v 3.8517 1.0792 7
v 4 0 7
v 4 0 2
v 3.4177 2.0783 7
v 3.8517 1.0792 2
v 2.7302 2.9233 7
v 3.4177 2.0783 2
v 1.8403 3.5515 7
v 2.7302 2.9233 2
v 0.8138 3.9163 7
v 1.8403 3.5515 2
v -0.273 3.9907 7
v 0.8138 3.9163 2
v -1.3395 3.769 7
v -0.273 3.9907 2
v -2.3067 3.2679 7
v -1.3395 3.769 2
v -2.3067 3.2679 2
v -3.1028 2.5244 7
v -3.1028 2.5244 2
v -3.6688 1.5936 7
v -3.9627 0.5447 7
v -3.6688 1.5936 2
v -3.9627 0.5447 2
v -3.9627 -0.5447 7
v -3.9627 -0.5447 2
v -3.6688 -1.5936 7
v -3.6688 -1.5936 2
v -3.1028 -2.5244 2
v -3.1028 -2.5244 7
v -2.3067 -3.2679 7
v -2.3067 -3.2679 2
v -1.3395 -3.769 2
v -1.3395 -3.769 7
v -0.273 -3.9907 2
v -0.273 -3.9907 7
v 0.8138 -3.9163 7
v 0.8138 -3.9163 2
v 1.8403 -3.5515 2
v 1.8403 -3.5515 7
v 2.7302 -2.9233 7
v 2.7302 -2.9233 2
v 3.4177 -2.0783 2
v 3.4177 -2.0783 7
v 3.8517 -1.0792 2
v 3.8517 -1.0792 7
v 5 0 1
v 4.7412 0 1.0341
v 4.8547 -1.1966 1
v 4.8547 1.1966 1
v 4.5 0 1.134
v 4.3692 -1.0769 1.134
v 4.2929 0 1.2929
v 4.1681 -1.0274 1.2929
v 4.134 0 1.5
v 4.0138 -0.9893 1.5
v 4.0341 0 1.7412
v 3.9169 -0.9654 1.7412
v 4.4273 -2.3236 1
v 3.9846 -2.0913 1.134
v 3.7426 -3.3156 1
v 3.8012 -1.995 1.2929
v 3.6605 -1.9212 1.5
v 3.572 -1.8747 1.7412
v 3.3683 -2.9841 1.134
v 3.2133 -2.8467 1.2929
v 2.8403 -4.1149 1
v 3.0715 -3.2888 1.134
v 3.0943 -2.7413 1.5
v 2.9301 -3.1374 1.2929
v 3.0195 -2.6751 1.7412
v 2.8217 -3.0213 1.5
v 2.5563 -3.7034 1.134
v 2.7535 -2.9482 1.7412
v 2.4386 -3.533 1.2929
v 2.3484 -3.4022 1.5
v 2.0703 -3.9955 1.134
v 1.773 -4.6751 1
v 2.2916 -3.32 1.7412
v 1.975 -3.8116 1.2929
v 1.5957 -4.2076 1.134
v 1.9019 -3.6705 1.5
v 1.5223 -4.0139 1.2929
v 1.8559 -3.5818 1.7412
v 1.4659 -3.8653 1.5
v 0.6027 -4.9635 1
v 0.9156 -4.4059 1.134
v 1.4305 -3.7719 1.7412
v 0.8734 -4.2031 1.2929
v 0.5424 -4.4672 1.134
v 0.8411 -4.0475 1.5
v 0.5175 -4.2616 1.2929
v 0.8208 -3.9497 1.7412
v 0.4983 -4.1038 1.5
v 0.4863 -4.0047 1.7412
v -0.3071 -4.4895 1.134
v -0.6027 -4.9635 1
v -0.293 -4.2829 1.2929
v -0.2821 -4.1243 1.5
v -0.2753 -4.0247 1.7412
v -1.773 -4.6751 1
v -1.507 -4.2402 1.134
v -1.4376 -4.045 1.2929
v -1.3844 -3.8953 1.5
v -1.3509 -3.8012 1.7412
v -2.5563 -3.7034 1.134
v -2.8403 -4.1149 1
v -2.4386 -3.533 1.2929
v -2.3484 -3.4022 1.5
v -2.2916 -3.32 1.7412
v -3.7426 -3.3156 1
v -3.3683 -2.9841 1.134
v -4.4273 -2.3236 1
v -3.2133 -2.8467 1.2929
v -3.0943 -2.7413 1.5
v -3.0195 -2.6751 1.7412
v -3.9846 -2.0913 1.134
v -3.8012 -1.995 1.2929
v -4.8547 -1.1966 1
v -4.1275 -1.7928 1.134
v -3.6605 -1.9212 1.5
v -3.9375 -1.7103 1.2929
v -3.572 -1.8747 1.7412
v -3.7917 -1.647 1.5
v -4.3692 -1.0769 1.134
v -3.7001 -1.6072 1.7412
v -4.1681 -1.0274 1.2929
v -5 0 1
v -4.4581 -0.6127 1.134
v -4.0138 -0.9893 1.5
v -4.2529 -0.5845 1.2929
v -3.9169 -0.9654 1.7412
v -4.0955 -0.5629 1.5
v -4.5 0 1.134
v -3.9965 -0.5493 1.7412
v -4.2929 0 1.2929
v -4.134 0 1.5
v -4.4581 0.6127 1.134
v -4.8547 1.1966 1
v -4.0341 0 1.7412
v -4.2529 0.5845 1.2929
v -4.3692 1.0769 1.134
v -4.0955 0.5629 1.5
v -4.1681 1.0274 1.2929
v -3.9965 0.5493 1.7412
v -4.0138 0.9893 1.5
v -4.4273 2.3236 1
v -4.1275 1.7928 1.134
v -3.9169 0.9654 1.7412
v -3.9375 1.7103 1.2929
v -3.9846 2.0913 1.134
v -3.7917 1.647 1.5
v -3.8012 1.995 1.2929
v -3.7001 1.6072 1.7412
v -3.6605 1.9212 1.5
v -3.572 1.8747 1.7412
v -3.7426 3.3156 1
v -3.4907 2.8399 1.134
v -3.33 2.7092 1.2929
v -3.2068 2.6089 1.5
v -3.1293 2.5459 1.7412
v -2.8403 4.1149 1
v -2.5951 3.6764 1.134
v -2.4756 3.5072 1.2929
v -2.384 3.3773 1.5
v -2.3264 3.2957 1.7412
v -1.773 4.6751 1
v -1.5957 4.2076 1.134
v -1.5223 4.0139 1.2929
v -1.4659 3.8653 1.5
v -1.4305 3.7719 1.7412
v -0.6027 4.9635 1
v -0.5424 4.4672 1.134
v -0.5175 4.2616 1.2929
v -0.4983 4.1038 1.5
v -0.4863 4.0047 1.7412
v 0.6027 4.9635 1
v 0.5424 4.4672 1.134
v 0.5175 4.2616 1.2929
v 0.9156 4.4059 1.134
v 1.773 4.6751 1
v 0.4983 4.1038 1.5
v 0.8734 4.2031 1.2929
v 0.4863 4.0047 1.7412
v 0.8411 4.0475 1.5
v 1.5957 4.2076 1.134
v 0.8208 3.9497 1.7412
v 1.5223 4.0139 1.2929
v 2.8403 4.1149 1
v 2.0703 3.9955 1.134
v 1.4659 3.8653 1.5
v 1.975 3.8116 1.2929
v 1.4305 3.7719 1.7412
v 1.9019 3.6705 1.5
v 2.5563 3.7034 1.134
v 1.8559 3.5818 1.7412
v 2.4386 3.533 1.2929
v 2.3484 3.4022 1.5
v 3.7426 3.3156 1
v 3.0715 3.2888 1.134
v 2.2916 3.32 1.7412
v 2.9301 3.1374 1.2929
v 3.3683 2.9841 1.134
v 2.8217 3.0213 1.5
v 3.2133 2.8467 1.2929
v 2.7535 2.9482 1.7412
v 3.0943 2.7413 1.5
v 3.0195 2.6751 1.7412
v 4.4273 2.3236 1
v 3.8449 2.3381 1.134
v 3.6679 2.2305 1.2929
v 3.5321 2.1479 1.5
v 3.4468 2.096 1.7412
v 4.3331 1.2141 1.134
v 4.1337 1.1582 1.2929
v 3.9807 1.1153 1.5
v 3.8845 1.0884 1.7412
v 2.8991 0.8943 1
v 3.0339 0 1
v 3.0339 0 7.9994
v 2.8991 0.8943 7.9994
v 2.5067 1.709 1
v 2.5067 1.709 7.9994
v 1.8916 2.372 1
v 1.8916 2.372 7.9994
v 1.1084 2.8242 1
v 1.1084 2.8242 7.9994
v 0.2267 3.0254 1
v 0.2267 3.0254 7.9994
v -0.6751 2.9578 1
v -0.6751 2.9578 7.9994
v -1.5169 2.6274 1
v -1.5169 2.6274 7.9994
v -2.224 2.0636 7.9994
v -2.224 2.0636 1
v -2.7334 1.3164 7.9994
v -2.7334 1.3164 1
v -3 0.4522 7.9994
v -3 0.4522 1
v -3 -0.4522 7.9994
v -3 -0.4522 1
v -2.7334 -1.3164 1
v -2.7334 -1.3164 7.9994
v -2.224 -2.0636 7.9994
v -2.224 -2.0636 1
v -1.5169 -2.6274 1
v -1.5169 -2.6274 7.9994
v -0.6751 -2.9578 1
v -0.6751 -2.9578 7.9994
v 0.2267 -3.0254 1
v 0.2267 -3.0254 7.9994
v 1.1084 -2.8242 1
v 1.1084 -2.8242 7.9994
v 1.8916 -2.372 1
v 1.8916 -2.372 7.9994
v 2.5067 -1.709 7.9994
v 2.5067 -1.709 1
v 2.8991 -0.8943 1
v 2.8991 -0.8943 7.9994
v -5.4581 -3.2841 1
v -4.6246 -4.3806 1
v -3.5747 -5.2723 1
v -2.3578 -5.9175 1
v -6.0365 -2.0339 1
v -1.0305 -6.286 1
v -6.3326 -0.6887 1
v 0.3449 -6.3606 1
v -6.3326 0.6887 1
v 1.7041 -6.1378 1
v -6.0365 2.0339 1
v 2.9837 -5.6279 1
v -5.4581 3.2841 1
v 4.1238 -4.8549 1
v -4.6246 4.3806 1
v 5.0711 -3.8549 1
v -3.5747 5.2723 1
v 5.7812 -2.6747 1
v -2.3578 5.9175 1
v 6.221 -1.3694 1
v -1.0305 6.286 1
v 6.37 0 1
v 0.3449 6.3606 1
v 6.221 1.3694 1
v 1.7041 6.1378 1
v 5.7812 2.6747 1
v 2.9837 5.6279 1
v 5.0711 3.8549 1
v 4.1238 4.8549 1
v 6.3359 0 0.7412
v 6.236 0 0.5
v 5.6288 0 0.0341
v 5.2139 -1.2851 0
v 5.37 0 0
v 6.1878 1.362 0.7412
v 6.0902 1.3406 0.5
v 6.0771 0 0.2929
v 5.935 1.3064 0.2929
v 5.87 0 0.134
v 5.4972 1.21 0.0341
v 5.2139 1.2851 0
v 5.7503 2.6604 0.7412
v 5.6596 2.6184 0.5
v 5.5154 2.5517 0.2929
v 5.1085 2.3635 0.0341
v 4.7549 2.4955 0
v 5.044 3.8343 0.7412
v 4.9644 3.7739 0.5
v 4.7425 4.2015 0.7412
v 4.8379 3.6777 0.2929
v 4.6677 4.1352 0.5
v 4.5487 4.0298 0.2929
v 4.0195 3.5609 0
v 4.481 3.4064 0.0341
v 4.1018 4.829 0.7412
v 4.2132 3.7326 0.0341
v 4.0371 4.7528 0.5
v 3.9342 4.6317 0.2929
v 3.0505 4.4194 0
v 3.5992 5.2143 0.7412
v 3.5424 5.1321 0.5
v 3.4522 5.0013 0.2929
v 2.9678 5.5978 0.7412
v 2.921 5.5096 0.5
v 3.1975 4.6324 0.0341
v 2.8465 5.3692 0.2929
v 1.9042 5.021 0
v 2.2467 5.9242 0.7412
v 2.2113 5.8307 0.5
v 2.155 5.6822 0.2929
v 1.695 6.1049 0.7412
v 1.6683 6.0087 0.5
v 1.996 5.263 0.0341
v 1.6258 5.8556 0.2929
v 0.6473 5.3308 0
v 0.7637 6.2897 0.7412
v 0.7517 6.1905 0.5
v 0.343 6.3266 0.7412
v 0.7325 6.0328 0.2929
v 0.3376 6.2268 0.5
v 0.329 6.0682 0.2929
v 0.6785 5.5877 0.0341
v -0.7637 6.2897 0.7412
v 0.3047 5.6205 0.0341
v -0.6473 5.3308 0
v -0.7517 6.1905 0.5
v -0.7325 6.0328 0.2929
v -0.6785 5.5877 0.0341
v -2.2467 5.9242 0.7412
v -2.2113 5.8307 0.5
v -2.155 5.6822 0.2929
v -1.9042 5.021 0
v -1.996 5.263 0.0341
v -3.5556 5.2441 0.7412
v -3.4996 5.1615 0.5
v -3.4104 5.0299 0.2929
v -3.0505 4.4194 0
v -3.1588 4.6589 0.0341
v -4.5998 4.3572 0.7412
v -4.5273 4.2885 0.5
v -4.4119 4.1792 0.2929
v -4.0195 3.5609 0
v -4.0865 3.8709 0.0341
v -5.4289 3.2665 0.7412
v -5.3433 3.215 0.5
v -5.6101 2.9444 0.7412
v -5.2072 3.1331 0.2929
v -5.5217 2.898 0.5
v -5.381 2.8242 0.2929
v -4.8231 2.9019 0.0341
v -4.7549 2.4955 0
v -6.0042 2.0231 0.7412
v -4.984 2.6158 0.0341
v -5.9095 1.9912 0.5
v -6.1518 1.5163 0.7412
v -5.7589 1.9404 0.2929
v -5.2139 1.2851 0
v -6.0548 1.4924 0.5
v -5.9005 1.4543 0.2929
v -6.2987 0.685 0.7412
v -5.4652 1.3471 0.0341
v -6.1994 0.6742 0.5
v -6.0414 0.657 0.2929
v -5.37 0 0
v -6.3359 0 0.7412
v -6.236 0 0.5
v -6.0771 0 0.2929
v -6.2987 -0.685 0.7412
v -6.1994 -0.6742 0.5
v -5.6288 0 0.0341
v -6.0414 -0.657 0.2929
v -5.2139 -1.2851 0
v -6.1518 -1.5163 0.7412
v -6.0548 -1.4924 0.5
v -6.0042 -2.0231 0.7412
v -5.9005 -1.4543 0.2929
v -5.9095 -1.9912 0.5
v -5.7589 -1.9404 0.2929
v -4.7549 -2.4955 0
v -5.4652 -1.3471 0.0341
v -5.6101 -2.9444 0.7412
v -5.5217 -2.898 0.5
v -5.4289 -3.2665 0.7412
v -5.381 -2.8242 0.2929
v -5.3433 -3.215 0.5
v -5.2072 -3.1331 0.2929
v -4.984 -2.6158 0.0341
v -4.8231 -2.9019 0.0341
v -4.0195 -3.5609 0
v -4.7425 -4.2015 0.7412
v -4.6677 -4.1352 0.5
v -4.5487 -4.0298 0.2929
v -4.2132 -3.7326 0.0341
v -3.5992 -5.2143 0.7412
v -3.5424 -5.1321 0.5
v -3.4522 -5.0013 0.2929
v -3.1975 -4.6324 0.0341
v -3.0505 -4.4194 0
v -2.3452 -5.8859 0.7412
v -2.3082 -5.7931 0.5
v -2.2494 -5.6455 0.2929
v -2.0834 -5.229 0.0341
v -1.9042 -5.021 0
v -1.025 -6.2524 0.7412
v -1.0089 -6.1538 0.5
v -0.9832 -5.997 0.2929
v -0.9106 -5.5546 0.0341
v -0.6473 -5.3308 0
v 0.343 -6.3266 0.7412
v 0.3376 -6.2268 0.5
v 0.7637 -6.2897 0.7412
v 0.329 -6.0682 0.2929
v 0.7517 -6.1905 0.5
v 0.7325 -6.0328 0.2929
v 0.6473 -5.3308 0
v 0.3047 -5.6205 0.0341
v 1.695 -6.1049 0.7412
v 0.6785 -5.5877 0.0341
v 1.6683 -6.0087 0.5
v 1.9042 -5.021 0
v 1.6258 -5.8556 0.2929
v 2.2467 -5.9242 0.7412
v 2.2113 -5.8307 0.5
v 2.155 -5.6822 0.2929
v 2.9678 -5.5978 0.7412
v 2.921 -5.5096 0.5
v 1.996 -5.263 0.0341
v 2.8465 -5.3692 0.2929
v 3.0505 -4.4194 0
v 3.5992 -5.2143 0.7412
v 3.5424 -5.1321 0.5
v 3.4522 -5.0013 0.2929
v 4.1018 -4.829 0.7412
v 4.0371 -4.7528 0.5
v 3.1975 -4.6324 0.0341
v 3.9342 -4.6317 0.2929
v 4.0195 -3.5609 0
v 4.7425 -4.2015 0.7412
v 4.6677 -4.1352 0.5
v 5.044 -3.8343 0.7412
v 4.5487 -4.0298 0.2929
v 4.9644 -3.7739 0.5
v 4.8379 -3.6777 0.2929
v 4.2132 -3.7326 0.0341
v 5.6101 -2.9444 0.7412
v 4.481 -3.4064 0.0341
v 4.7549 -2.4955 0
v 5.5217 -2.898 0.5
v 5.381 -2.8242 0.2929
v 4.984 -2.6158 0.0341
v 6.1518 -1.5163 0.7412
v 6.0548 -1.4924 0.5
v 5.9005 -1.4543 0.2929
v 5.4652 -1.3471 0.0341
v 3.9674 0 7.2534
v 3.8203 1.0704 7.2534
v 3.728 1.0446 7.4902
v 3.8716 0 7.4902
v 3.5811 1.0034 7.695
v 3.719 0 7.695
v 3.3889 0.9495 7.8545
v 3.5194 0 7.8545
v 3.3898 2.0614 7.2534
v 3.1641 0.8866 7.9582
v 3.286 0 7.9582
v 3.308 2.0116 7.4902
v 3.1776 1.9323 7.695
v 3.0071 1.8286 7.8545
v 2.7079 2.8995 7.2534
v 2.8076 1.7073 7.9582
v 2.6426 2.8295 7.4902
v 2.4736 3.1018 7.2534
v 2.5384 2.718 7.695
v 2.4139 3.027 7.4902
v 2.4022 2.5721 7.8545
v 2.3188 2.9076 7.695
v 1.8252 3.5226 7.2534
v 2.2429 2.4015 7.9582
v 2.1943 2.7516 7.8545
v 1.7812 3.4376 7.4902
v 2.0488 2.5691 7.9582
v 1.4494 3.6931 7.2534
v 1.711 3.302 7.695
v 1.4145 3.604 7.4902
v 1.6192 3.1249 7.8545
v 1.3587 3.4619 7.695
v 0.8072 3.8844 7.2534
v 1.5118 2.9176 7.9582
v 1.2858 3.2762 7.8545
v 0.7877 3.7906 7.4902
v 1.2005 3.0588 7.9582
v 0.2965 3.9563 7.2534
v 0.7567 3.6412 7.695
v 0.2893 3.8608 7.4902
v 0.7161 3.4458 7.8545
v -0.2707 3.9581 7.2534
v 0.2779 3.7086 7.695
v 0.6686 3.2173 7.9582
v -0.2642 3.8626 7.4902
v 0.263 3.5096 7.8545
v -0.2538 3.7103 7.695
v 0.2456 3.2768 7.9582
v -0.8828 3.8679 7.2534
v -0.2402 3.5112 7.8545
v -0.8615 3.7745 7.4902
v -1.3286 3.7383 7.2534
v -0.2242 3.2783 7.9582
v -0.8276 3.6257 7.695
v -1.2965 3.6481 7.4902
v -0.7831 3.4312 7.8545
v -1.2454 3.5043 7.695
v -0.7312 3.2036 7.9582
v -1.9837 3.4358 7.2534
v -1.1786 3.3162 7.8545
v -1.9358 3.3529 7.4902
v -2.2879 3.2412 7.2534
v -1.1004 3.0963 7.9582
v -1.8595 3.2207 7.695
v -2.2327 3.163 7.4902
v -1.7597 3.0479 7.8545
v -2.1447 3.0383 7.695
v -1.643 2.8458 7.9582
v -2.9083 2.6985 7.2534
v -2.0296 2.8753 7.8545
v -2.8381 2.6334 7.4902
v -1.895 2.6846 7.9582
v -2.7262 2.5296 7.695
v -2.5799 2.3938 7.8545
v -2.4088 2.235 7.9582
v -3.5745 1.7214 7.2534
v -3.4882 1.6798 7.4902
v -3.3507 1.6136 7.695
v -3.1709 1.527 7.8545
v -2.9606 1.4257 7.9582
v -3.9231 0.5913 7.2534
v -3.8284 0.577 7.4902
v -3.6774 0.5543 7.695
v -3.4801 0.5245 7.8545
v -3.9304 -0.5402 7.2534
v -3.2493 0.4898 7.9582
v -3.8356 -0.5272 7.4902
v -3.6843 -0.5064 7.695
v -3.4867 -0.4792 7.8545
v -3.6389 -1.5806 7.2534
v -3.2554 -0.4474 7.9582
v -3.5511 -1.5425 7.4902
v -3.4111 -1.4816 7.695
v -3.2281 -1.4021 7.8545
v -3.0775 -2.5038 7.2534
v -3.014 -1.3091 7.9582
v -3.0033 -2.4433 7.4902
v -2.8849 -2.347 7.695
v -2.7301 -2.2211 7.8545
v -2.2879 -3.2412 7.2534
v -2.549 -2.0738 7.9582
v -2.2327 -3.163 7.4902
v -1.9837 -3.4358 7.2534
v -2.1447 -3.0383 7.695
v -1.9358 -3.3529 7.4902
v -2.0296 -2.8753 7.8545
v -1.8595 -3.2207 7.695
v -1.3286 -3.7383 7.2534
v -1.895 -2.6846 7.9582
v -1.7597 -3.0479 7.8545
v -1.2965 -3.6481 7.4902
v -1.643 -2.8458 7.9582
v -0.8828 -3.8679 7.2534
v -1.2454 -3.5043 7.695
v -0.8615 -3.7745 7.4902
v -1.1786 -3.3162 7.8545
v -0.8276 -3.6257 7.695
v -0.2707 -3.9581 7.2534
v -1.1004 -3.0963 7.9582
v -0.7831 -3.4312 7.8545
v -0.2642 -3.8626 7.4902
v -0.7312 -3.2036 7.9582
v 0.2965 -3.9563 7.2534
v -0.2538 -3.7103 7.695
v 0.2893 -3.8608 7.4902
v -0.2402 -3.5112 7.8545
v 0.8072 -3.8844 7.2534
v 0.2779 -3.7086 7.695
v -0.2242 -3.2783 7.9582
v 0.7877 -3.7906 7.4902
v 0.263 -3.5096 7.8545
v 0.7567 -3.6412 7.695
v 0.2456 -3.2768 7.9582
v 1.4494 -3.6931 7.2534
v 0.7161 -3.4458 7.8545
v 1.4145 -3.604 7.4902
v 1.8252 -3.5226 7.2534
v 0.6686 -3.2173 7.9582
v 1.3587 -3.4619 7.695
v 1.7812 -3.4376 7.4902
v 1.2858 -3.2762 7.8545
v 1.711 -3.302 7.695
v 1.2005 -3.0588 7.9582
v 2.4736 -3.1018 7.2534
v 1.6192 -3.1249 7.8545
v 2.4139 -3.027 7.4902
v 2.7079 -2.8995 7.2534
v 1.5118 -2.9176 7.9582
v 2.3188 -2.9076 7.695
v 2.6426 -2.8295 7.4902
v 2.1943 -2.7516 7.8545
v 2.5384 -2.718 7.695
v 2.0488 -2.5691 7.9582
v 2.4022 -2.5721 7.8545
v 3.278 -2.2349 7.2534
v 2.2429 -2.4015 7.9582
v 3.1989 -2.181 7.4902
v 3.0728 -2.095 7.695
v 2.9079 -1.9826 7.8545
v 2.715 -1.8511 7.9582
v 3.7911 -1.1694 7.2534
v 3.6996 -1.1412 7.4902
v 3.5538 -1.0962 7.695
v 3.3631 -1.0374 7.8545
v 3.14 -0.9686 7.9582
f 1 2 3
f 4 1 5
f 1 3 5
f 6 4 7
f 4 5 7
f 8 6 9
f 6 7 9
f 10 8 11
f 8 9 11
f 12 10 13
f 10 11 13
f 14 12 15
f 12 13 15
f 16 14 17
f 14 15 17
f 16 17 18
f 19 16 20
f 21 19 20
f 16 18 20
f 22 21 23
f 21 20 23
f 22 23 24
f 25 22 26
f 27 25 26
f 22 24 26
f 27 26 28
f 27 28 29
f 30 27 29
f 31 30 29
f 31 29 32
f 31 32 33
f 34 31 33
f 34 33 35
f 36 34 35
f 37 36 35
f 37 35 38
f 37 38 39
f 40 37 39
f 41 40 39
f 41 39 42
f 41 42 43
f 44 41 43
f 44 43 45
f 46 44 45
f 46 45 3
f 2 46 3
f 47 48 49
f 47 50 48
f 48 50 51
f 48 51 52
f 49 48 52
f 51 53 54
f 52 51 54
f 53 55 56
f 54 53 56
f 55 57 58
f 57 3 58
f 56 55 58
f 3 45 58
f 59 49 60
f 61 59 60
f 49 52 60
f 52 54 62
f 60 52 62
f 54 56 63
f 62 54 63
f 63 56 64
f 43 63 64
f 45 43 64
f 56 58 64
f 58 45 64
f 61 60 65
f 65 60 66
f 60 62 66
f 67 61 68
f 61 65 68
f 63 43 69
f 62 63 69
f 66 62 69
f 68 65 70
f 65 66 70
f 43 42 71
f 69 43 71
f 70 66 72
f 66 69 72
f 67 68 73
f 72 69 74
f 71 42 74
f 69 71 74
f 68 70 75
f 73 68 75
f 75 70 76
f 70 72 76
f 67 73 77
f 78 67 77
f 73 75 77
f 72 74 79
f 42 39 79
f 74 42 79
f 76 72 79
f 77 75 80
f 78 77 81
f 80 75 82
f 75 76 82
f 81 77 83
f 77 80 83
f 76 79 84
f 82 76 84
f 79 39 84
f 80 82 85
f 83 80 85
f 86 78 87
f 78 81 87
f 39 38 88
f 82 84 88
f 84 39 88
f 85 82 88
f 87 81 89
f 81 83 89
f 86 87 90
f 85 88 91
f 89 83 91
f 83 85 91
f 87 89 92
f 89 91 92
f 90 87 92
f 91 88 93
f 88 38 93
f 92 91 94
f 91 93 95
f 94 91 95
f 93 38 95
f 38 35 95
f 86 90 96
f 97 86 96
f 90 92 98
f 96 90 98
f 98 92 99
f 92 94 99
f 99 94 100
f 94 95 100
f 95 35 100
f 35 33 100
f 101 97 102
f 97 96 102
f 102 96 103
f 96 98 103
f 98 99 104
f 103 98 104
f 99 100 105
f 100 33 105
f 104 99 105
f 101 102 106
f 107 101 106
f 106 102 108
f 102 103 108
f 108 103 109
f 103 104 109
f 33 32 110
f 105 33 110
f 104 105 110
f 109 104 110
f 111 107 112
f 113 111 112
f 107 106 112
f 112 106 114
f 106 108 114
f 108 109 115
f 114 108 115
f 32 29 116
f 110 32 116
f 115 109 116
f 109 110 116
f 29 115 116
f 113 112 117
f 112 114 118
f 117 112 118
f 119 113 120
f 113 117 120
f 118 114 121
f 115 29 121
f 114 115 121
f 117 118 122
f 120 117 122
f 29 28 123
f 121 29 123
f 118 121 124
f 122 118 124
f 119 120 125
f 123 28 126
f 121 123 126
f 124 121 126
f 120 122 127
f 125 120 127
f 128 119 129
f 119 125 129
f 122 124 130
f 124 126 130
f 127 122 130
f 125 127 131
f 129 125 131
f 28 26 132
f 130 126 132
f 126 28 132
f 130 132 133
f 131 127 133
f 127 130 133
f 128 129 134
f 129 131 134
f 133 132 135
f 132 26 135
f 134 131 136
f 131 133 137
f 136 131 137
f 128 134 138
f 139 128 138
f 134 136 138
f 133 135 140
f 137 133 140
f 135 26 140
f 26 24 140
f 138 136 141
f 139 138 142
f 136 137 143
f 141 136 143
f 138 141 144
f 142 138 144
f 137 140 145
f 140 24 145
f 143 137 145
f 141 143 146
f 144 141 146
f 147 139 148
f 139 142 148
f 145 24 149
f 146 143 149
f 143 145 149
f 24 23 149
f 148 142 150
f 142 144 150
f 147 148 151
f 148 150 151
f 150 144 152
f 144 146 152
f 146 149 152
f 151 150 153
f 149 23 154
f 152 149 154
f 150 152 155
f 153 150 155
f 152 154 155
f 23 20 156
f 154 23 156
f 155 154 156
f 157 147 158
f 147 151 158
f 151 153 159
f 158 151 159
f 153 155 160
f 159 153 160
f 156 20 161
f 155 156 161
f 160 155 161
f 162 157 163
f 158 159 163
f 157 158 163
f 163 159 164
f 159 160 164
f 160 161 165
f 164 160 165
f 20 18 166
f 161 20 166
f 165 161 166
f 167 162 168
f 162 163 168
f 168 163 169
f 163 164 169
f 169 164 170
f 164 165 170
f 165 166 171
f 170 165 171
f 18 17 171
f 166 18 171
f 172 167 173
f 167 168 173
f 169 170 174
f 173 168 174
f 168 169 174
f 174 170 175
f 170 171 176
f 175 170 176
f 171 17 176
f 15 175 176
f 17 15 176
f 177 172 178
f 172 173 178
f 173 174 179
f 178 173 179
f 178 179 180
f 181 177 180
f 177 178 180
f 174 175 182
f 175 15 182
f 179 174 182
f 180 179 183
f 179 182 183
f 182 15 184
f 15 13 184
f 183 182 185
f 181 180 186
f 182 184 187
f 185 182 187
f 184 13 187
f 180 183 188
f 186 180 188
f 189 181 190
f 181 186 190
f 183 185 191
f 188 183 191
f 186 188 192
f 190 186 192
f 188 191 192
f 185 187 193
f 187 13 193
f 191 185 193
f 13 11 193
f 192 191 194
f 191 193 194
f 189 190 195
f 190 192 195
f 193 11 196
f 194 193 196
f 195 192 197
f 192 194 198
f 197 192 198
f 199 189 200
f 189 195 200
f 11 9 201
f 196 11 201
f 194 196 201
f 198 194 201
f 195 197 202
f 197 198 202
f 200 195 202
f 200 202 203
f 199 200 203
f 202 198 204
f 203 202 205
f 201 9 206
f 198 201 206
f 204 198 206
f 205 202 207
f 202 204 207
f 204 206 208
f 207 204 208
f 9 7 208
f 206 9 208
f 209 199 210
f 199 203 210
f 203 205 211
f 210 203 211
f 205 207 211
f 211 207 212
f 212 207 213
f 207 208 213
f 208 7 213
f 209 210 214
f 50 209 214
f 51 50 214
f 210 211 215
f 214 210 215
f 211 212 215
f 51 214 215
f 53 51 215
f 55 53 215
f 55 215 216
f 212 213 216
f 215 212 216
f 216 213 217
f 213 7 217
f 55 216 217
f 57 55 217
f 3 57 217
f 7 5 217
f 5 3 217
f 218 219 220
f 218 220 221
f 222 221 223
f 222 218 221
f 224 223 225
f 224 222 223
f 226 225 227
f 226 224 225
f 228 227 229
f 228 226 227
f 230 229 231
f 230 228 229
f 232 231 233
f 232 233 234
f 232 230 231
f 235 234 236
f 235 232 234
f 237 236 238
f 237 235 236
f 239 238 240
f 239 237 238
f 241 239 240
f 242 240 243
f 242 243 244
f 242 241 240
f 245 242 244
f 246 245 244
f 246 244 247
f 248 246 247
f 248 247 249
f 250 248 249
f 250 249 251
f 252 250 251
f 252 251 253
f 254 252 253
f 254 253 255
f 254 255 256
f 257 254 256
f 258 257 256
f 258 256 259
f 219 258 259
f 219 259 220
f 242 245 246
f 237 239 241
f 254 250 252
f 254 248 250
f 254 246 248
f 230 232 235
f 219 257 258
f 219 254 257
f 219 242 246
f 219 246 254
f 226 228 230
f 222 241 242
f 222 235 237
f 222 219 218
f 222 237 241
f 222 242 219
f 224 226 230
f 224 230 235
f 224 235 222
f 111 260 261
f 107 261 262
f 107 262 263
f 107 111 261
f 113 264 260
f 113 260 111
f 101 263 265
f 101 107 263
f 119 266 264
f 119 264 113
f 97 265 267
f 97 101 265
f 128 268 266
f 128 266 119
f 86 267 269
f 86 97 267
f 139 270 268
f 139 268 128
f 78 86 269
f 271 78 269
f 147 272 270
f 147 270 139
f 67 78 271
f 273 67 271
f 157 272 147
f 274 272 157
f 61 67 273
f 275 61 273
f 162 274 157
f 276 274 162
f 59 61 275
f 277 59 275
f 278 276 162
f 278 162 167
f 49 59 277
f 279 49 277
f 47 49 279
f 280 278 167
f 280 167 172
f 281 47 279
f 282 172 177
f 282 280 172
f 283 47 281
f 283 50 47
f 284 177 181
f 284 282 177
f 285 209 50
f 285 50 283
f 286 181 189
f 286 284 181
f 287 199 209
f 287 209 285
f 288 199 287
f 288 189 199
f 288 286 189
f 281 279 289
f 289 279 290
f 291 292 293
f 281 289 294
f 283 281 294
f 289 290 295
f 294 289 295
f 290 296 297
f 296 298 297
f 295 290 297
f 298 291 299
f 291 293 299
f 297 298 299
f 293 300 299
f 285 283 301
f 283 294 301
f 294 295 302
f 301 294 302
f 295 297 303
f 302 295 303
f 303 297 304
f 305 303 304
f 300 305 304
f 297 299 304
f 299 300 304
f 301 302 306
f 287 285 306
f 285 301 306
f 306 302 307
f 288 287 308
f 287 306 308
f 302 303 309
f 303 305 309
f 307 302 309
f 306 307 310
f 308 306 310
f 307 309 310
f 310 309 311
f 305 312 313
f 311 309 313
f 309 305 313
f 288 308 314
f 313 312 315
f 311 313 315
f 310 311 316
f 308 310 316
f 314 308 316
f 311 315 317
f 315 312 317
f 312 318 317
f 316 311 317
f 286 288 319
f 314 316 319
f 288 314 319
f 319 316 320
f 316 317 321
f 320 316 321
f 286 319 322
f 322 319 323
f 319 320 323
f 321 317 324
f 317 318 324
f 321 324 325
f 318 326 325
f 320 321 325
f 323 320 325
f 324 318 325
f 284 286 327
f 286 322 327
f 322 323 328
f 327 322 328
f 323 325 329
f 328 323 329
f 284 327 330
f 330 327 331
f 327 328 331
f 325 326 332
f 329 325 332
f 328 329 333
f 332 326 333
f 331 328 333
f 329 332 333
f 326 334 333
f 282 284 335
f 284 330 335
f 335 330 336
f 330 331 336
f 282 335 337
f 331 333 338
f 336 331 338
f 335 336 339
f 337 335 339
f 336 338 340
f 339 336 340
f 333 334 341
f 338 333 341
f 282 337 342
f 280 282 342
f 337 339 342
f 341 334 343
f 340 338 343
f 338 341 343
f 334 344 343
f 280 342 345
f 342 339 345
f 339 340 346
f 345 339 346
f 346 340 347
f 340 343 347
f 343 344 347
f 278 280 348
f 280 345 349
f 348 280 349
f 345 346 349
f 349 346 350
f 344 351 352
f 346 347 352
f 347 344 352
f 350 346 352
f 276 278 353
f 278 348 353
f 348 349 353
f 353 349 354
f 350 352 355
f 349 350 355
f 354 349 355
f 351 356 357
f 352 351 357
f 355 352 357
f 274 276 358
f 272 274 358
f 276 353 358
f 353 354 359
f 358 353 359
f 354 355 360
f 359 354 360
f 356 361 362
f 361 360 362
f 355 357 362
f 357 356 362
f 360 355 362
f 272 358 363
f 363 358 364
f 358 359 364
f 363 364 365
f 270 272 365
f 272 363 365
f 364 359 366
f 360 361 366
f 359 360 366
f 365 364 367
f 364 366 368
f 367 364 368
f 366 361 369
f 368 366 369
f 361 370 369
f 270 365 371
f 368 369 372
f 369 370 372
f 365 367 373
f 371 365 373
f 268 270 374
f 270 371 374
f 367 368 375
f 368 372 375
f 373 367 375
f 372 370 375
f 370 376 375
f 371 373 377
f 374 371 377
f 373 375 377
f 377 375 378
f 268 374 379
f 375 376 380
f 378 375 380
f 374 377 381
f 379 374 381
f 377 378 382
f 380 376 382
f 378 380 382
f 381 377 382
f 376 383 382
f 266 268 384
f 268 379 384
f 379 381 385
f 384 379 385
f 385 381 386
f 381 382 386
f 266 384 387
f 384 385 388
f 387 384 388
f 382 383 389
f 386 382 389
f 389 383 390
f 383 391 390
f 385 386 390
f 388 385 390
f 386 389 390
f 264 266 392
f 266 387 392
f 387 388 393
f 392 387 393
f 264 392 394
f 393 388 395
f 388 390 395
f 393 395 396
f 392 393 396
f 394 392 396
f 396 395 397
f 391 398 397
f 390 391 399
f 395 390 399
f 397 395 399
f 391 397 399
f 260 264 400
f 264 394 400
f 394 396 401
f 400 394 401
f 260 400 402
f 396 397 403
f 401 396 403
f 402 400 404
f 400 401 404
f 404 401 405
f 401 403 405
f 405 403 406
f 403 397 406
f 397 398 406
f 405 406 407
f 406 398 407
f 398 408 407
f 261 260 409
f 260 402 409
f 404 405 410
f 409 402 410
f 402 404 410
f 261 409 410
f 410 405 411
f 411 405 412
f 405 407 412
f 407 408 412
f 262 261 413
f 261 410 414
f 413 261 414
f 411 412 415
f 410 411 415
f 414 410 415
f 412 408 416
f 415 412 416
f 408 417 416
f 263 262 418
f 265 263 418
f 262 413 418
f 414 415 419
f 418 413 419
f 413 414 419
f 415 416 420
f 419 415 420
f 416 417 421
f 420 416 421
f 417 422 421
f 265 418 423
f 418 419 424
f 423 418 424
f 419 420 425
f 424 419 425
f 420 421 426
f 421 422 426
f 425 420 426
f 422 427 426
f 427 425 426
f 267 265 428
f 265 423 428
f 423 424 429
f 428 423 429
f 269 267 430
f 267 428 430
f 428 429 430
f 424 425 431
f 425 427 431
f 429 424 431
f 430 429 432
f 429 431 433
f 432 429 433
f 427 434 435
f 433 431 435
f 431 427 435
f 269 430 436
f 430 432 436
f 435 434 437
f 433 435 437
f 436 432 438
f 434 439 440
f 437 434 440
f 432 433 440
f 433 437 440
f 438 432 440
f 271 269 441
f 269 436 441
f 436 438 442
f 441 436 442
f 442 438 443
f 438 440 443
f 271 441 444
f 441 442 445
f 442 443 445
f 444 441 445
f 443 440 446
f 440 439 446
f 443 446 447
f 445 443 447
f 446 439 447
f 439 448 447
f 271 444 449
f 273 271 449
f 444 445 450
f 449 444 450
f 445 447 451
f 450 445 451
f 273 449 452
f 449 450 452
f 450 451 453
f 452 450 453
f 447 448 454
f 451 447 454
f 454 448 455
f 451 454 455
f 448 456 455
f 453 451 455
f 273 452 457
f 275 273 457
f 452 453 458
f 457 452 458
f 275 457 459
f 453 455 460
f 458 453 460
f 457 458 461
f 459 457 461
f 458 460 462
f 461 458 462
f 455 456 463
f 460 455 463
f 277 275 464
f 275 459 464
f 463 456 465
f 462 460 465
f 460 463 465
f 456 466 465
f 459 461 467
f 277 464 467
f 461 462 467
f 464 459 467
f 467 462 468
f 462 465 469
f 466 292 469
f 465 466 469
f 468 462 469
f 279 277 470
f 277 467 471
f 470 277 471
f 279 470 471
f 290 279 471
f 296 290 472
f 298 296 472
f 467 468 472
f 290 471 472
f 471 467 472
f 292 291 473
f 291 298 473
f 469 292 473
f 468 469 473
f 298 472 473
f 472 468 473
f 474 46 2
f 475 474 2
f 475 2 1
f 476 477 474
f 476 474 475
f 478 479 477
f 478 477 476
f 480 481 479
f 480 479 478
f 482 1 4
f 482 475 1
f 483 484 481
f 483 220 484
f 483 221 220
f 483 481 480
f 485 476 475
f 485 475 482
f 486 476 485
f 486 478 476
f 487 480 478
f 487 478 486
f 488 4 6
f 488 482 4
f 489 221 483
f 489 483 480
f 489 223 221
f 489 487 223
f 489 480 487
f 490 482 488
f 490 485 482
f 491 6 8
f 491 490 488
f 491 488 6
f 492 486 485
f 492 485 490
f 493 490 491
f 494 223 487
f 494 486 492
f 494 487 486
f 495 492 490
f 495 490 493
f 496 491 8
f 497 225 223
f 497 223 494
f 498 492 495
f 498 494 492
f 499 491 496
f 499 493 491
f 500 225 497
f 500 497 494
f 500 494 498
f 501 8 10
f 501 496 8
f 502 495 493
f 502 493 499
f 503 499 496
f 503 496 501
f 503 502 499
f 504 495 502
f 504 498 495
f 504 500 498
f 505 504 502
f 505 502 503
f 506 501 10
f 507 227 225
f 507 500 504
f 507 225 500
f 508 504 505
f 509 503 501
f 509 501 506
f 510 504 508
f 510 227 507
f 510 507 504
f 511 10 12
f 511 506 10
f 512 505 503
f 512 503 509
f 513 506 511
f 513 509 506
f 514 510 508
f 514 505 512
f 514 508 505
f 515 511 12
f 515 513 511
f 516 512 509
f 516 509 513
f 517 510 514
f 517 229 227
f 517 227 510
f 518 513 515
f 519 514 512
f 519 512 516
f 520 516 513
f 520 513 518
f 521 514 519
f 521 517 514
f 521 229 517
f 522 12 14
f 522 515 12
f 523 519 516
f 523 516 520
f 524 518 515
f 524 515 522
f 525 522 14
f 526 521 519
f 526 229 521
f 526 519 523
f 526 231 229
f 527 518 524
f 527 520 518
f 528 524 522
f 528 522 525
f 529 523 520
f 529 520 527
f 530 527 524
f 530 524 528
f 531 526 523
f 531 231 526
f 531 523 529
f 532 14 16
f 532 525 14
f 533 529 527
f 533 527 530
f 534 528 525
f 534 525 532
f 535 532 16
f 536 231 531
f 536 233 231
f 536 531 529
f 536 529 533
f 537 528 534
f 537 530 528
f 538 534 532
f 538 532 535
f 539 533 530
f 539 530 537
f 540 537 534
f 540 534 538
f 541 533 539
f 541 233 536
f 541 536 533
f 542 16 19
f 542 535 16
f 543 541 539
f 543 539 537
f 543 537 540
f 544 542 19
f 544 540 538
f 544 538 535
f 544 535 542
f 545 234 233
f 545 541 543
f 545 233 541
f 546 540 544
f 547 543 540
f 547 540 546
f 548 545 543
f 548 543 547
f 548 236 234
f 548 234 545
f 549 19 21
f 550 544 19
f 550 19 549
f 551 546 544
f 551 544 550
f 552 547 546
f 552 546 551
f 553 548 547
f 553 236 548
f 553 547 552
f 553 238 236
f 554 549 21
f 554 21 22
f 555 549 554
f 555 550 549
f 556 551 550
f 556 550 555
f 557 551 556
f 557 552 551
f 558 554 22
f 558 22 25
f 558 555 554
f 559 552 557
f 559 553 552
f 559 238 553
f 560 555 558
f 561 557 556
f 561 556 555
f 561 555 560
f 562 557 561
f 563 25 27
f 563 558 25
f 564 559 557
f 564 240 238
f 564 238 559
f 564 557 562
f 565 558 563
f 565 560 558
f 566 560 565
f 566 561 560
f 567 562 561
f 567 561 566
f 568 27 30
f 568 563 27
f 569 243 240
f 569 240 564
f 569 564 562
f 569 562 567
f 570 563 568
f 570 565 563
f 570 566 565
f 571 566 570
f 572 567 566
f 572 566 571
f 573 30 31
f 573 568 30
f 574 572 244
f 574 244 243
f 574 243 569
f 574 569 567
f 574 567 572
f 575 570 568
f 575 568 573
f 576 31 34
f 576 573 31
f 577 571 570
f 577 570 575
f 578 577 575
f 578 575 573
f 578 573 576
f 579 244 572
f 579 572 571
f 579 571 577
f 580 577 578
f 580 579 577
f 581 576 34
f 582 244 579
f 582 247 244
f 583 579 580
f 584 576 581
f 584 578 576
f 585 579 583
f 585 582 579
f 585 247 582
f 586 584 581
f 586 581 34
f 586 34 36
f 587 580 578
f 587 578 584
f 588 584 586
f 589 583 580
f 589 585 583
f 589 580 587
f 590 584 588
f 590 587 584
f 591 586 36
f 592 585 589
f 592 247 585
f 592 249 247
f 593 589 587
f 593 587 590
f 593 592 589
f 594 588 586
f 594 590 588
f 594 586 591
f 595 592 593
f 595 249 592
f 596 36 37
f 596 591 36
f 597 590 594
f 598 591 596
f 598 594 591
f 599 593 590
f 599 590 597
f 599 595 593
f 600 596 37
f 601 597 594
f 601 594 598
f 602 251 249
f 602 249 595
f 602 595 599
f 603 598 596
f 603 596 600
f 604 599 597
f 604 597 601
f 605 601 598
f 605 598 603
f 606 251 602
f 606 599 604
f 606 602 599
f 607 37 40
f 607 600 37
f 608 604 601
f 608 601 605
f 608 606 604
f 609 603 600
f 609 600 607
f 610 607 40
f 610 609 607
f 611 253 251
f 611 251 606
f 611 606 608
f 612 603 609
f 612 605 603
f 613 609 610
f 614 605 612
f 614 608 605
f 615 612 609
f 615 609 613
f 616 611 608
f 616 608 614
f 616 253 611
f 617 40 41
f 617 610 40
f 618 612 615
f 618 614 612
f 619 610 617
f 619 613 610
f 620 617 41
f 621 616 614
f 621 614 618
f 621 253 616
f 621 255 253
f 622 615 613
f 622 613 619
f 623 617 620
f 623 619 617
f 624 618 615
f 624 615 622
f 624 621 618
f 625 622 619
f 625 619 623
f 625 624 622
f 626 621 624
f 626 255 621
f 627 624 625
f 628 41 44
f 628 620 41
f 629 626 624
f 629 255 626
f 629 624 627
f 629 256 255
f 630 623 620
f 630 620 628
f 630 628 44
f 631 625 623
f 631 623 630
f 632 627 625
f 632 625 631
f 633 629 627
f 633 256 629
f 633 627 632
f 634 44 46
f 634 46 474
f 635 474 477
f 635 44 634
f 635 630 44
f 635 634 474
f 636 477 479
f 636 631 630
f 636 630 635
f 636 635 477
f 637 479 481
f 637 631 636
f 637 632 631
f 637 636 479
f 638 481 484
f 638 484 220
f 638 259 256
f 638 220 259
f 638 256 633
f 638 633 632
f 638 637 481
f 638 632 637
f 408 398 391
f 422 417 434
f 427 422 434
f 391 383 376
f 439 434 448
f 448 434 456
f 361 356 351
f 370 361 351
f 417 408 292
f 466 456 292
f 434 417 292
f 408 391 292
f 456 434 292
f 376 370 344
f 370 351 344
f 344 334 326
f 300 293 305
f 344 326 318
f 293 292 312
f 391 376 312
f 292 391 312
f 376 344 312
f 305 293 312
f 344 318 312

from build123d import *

# Parameters (mm, degrees)
F0_R     = 4
F1_DEPTH = 8
F2_R     = 3.0338863289
F3_DEPTH = 9.4
F4_R     = 6.3699570271
F5_DEPTH = 1
F6_R     = 1


# Not quite as in the source:
# - a fillet or chamfer that OpenCascade refuses, or shapes differently, is made with other operations: its cross-section is extruded or revolved along the edge and cut away or added


with BuildPart() as f1:
    # F0 (on Top) → F1 (new body)
    with BuildSketch(Plane.XY):
        Circle(F0_R)
    extrude(amount=F1_DEPTH)

    # F2 (on Top) → F3 (cut)
    with BuildSketch(Plane.XY):
        Circle(F2_R)
    extrude(amount=F3_DEPTH, mode=Mode.SUBTRACT)

    # F4 (on Top) → F5 (join)
    with BuildSketch(Plane.XY):
        Circle(F4_R)
    extrude(amount=F5_DEPTH)

    # F6
    f6_edges = [f1.edges().sort_by_distance(p)[0] for p in [
        (-4, 0, 1),
    ]]
    fillet(f6_edges, radius=F6_R)

    # F7: fillet of radius 1 on 2 edges, made by hand

    # F7_s1 → F7_t2 (revolve, cut)
    with BuildSketch(Plane.XZ):
        with BuildLine():
            ThreePointArc((6.3699570271, 1), (6.0770638082, 0.2928932188), (5.3699570271, 0))
            Line((5.3699570271, 0), (6.3699570271, 0))
            Line((6.3699570271, 0), (6.3699570271, 1))
        make_face()
    revolve(axis=Axis((0, 0, 0), (0, 0, 1)), mode=Mode.SUBTRACT)

    # F7_s3 → F7_t4 (revolve, cut)
    with BuildSketch(Plane.XZ):
        with BuildLine():
            ThreePointArc((4, 7), (3.7071067812, 7.7071067812), (3, 8))
            Line((3, 8), (4, 8))
            Line((4, 8), (4, 7))
        make_face()
    revolve(axis=Axis((0, 0, 8), (0, 0, 1)), mode=Mode.SUBTRACT)


solid = f1.part
